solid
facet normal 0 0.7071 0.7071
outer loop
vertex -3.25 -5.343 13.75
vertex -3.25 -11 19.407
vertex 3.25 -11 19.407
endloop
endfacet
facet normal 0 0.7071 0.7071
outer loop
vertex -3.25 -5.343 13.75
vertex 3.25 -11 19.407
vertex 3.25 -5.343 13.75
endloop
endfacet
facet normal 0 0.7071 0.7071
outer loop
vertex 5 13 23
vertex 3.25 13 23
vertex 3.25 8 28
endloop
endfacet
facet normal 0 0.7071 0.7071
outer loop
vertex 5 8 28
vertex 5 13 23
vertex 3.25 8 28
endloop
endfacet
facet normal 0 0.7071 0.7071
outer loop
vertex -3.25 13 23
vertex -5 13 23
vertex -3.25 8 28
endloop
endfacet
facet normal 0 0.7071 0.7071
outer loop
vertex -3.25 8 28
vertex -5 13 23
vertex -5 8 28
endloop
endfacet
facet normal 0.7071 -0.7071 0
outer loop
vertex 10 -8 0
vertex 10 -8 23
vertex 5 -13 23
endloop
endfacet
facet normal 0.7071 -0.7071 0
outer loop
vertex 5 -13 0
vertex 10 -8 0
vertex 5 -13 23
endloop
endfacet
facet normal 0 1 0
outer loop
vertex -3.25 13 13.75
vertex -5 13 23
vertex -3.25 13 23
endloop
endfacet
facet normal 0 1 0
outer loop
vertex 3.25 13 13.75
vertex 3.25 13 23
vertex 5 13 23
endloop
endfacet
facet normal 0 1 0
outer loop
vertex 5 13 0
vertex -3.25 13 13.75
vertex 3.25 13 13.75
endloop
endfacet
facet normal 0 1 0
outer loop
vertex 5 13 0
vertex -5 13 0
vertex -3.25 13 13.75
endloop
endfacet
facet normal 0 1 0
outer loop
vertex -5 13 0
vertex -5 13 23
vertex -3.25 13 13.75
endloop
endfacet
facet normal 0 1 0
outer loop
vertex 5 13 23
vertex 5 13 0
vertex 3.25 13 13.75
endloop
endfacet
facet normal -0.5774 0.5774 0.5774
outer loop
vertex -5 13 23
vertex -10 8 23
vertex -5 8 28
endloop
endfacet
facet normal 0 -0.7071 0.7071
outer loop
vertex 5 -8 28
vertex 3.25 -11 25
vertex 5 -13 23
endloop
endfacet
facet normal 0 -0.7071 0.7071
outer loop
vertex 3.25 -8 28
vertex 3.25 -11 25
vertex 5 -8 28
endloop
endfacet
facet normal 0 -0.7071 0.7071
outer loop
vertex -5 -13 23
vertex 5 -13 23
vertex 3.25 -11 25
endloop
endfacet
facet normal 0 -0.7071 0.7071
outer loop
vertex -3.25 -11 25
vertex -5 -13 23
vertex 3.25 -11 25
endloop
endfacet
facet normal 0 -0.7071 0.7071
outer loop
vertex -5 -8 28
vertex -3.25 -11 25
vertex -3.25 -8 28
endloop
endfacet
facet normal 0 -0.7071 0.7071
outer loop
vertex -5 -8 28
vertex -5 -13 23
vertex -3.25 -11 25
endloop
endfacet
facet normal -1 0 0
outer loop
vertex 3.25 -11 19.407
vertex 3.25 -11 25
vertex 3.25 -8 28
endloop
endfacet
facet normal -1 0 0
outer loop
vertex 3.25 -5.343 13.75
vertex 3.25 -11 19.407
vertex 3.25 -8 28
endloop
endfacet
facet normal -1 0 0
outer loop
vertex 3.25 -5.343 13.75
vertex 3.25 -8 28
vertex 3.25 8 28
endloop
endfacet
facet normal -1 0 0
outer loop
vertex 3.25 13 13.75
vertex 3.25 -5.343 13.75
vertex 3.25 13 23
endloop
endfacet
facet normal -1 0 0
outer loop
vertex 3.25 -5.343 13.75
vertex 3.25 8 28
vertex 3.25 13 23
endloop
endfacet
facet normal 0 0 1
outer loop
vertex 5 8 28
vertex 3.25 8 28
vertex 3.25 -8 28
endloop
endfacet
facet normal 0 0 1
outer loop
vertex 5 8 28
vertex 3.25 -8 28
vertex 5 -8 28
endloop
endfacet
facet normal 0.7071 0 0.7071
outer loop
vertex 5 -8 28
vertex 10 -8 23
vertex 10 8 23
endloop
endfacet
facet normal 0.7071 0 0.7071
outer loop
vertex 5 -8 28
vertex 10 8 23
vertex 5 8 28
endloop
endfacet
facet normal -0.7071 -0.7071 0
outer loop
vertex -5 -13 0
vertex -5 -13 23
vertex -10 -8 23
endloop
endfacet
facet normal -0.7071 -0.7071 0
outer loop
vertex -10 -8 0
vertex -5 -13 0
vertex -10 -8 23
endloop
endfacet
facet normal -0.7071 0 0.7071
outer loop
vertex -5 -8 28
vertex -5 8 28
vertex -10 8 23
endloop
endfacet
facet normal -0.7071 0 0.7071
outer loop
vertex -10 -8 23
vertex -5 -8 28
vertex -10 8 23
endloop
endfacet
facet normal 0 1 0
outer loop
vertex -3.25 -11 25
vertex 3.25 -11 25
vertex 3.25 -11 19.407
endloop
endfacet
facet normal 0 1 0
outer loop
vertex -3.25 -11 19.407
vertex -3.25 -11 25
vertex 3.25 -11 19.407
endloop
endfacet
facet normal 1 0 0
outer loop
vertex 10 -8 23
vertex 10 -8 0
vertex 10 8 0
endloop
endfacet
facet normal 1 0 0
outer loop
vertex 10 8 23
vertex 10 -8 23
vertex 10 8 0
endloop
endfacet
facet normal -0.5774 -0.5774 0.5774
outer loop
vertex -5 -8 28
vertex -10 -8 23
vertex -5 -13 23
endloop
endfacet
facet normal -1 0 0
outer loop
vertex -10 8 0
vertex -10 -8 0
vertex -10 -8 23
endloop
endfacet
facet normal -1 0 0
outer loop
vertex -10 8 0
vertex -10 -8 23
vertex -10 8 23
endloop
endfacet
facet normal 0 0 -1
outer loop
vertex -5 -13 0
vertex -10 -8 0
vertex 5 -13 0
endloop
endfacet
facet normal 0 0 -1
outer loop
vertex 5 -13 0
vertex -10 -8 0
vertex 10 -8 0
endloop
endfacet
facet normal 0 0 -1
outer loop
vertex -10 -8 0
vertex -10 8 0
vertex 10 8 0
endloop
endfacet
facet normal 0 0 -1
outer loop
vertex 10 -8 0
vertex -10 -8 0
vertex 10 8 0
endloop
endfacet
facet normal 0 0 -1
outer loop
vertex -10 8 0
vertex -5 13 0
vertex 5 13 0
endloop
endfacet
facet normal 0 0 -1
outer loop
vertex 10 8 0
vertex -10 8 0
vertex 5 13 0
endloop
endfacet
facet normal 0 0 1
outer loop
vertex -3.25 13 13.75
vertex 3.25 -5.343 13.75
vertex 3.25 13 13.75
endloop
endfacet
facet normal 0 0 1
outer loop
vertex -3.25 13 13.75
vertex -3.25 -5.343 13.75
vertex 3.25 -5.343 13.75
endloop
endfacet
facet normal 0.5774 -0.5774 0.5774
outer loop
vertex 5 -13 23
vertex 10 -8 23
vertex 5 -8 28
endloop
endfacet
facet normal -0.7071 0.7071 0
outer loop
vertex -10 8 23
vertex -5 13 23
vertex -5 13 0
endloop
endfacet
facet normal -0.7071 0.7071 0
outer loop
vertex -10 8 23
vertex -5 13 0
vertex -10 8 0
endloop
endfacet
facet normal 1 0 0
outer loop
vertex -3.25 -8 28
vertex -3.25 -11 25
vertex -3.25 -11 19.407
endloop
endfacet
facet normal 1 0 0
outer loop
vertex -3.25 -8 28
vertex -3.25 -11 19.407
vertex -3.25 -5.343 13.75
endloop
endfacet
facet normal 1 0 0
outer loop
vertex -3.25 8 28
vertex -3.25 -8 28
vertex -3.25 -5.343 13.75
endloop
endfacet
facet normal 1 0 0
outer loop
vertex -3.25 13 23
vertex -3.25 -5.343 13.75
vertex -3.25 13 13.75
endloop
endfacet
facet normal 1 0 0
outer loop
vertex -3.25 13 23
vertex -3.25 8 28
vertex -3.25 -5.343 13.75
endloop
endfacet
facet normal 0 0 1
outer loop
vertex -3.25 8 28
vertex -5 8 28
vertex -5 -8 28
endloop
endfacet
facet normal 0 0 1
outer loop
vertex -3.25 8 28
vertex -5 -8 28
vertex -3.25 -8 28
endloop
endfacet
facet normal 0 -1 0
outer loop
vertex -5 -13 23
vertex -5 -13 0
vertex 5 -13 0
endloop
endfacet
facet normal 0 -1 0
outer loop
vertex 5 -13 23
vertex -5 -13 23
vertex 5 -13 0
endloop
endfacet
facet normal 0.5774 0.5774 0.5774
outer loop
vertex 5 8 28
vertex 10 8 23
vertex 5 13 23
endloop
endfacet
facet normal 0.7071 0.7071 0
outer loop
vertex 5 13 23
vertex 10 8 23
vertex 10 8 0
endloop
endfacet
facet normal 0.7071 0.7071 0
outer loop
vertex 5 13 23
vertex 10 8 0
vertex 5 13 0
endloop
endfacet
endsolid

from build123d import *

# Parameters (mm, degrees)
F0_W          = 20
F0_H          = 26
F1_DEPTH      = 28
F3_DEPTH      = 3.25
F3_DEPTH_BACK = 3.25
F4_T1_DEPTH   = 6.3508529611
F4_T3_DEPTH   = 6.3508529611
F4_T5_DEPTH   = 6.3508529611
F4_T7_DEPTH   = 6.3508529611
F4_T9_DEPTH   = 51.7168298797
F4_T11_DEPTH  = 45.7168298797
F4_T13_DEPTH  = 53.7168298797
F4_T15_DEPTH  = 32.4668298797
F4_T17_DEPTH  = 32.4668298797


# Not quite as in the source:
# - a fillet or chamfer that OpenCascade refuses, or shapes differently, is made with other operations: its cross-section is extruded or revolved along the edge and cut away or added


with BuildPart() as f1:
    # F0 (on Top) → F1 (new body)
    with BuildSketch(Plane.XY):
        Rectangle(F0_W, F0_H)
    extrude(amount=F1_DEPTH)

    # F2 (on Right) → F3 (cut, two sides)
    with BuildSketch(Plane.YZ) as f3_sk:
        Polygon((13, 28), (-11, 28), (-11, 19.4068542495), (-5.3431457505, 13.75), (13, 13.75), align=None)
    extrude(amount=-F3_DEPTH, mode=Mode.SUBTRACT)
    extrude(f3_sk.sketch, amount=F3_DEPTH_BACK, mode=Mode.SUBTRACT)

    # F4: chamfer of 5 on 9 edges, made by hand

    # F4_s2 → F4_t1 (cut)
    with BuildSketch(Plane(origin=(13.6666666667, -13.6666666667, 13.6666666667), x_dir=(0.7071067812, 0.7071067812, 0), z_dir=(0.5773502692, -0.5773502692, 0.5773502692))):
        Polygon((1.4142135624, 11.430952133), (-5.6568542495, 11.430952133), (-2.1213203436, 17.5546764899), align=None)
    extrude(amount=F4_T1_DEPTH, mode=Mode.SUBTRACT)

    # F4_s4 → F4_t3 (cut)
    with BuildSketch(Plane(origin=(13.6666666667, 13.6666666667, 13.6666666667), x_dir=(-0.7071067812, 0.7071067812, 0), z_dir=(0.5773502692, 0.5773502692, 0.5773502692))):
        Polygon((-1.4142135624, 11.430952133), (5.6568542495, 11.430952133), (2.1213203436, 17.5546764899), align=None)
    extrude(amount=F4_T3_DEPTH, mode=Mode.SUBTRACT)

    # F4_s6 → F4_t5 (cut)
    with BuildSketch(Plane(origin=(-13.6666666667, -13.6666666667, 13.6666666667), x_dir=(0.7071067812, -0.7071067812, 0), z_dir=(-0.5773502692, -0.5773502692, 0.5773502692))):
        Polygon((5.6568542495, 11.430952133), (2.1213203436, 17.5546764899), (-1.4142135624, 11.430952133), align=None)
    extrude(amount=F4_T5_DEPTH, mode=Mode.SUBTRACT)

    # F4_s8 → F4_t7 (cut)
    with BuildSketch(Plane(origin=(-13.6666666667, 13.6666666667, 13.6666666667), x_dir=(-0.7071067812, -0.7071067812, 0), z_dir=(-0.5773502692, 0.5773502692, 0.5773502692))):
        Polygon((-5.6568542495, 11.430952133), (-2.1213203436, 17.5546764899), (1.4142135624, 11.430952133), align=None)
    extrude(amount=F4_T7_DEPTH, mode=Mode.SUBTRACT)

    # F4_s10 → F4_t9 (cut)
    with BuildSketch(Plane.XZ.offset(-25.8584149398)):
        Polygon((10, 23), (5, 28), (10, 28), align=None)
        Polygon((-5, 28), (-10, 23), (-10, 28), align=None)
    extrude(amount=F4_T9_DEPTH, mode=Mode.SUBTRACT)

    # F4_s12 → F4_t11 (cut)
    with BuildSketch(Plane.YZ.offset(-22.8584149398)):
        Polygon((-13, 23), (-8, 28), (-13, 28), align=None)
    extrude(amount=F4_T11_DEPTH, mode=Mode.SUBTRACT)

    # F4_s14 → F4_t13 (cut)
    with BuildSketch(Plane.XY.offset(-12.8584149398)):
        Polygon((10, -8), (5, -13), (10, -13), align=None)
        Polygon((-5, -13), (-10, -8), (-10, -13), align=None)
        Polygon((10, 8), (5, 13), (10, 13), align=None)
        Polygon((-5, 13), (-10, 8), (-10, 13), align=None)
    extrude(amount=F4_T13_DEPTH, mode=Mode.SUBTRACT)

    # F4_s16 → F4_t15 (cut)
    with BuildSketch(Plane.YZ.offset(-22.8584149398)):
        Polygon((13, 23), (8, 28), (13, 28), align=None)
    extrude(amount=F4_T15_DEPTH, mode=Mode.SUBTRACT)

    # F4_s18 → F4_t17 (cut)
    with BuildSketch(Plane.YZ.offset(-9.6084149398)):
        Polygon((13, 23), (8, 28), (13, 28), align=None)
    extrude(amount=F4_T17_DEPTH, mode=Mode.SUBTRACT)


solid = f1.part
